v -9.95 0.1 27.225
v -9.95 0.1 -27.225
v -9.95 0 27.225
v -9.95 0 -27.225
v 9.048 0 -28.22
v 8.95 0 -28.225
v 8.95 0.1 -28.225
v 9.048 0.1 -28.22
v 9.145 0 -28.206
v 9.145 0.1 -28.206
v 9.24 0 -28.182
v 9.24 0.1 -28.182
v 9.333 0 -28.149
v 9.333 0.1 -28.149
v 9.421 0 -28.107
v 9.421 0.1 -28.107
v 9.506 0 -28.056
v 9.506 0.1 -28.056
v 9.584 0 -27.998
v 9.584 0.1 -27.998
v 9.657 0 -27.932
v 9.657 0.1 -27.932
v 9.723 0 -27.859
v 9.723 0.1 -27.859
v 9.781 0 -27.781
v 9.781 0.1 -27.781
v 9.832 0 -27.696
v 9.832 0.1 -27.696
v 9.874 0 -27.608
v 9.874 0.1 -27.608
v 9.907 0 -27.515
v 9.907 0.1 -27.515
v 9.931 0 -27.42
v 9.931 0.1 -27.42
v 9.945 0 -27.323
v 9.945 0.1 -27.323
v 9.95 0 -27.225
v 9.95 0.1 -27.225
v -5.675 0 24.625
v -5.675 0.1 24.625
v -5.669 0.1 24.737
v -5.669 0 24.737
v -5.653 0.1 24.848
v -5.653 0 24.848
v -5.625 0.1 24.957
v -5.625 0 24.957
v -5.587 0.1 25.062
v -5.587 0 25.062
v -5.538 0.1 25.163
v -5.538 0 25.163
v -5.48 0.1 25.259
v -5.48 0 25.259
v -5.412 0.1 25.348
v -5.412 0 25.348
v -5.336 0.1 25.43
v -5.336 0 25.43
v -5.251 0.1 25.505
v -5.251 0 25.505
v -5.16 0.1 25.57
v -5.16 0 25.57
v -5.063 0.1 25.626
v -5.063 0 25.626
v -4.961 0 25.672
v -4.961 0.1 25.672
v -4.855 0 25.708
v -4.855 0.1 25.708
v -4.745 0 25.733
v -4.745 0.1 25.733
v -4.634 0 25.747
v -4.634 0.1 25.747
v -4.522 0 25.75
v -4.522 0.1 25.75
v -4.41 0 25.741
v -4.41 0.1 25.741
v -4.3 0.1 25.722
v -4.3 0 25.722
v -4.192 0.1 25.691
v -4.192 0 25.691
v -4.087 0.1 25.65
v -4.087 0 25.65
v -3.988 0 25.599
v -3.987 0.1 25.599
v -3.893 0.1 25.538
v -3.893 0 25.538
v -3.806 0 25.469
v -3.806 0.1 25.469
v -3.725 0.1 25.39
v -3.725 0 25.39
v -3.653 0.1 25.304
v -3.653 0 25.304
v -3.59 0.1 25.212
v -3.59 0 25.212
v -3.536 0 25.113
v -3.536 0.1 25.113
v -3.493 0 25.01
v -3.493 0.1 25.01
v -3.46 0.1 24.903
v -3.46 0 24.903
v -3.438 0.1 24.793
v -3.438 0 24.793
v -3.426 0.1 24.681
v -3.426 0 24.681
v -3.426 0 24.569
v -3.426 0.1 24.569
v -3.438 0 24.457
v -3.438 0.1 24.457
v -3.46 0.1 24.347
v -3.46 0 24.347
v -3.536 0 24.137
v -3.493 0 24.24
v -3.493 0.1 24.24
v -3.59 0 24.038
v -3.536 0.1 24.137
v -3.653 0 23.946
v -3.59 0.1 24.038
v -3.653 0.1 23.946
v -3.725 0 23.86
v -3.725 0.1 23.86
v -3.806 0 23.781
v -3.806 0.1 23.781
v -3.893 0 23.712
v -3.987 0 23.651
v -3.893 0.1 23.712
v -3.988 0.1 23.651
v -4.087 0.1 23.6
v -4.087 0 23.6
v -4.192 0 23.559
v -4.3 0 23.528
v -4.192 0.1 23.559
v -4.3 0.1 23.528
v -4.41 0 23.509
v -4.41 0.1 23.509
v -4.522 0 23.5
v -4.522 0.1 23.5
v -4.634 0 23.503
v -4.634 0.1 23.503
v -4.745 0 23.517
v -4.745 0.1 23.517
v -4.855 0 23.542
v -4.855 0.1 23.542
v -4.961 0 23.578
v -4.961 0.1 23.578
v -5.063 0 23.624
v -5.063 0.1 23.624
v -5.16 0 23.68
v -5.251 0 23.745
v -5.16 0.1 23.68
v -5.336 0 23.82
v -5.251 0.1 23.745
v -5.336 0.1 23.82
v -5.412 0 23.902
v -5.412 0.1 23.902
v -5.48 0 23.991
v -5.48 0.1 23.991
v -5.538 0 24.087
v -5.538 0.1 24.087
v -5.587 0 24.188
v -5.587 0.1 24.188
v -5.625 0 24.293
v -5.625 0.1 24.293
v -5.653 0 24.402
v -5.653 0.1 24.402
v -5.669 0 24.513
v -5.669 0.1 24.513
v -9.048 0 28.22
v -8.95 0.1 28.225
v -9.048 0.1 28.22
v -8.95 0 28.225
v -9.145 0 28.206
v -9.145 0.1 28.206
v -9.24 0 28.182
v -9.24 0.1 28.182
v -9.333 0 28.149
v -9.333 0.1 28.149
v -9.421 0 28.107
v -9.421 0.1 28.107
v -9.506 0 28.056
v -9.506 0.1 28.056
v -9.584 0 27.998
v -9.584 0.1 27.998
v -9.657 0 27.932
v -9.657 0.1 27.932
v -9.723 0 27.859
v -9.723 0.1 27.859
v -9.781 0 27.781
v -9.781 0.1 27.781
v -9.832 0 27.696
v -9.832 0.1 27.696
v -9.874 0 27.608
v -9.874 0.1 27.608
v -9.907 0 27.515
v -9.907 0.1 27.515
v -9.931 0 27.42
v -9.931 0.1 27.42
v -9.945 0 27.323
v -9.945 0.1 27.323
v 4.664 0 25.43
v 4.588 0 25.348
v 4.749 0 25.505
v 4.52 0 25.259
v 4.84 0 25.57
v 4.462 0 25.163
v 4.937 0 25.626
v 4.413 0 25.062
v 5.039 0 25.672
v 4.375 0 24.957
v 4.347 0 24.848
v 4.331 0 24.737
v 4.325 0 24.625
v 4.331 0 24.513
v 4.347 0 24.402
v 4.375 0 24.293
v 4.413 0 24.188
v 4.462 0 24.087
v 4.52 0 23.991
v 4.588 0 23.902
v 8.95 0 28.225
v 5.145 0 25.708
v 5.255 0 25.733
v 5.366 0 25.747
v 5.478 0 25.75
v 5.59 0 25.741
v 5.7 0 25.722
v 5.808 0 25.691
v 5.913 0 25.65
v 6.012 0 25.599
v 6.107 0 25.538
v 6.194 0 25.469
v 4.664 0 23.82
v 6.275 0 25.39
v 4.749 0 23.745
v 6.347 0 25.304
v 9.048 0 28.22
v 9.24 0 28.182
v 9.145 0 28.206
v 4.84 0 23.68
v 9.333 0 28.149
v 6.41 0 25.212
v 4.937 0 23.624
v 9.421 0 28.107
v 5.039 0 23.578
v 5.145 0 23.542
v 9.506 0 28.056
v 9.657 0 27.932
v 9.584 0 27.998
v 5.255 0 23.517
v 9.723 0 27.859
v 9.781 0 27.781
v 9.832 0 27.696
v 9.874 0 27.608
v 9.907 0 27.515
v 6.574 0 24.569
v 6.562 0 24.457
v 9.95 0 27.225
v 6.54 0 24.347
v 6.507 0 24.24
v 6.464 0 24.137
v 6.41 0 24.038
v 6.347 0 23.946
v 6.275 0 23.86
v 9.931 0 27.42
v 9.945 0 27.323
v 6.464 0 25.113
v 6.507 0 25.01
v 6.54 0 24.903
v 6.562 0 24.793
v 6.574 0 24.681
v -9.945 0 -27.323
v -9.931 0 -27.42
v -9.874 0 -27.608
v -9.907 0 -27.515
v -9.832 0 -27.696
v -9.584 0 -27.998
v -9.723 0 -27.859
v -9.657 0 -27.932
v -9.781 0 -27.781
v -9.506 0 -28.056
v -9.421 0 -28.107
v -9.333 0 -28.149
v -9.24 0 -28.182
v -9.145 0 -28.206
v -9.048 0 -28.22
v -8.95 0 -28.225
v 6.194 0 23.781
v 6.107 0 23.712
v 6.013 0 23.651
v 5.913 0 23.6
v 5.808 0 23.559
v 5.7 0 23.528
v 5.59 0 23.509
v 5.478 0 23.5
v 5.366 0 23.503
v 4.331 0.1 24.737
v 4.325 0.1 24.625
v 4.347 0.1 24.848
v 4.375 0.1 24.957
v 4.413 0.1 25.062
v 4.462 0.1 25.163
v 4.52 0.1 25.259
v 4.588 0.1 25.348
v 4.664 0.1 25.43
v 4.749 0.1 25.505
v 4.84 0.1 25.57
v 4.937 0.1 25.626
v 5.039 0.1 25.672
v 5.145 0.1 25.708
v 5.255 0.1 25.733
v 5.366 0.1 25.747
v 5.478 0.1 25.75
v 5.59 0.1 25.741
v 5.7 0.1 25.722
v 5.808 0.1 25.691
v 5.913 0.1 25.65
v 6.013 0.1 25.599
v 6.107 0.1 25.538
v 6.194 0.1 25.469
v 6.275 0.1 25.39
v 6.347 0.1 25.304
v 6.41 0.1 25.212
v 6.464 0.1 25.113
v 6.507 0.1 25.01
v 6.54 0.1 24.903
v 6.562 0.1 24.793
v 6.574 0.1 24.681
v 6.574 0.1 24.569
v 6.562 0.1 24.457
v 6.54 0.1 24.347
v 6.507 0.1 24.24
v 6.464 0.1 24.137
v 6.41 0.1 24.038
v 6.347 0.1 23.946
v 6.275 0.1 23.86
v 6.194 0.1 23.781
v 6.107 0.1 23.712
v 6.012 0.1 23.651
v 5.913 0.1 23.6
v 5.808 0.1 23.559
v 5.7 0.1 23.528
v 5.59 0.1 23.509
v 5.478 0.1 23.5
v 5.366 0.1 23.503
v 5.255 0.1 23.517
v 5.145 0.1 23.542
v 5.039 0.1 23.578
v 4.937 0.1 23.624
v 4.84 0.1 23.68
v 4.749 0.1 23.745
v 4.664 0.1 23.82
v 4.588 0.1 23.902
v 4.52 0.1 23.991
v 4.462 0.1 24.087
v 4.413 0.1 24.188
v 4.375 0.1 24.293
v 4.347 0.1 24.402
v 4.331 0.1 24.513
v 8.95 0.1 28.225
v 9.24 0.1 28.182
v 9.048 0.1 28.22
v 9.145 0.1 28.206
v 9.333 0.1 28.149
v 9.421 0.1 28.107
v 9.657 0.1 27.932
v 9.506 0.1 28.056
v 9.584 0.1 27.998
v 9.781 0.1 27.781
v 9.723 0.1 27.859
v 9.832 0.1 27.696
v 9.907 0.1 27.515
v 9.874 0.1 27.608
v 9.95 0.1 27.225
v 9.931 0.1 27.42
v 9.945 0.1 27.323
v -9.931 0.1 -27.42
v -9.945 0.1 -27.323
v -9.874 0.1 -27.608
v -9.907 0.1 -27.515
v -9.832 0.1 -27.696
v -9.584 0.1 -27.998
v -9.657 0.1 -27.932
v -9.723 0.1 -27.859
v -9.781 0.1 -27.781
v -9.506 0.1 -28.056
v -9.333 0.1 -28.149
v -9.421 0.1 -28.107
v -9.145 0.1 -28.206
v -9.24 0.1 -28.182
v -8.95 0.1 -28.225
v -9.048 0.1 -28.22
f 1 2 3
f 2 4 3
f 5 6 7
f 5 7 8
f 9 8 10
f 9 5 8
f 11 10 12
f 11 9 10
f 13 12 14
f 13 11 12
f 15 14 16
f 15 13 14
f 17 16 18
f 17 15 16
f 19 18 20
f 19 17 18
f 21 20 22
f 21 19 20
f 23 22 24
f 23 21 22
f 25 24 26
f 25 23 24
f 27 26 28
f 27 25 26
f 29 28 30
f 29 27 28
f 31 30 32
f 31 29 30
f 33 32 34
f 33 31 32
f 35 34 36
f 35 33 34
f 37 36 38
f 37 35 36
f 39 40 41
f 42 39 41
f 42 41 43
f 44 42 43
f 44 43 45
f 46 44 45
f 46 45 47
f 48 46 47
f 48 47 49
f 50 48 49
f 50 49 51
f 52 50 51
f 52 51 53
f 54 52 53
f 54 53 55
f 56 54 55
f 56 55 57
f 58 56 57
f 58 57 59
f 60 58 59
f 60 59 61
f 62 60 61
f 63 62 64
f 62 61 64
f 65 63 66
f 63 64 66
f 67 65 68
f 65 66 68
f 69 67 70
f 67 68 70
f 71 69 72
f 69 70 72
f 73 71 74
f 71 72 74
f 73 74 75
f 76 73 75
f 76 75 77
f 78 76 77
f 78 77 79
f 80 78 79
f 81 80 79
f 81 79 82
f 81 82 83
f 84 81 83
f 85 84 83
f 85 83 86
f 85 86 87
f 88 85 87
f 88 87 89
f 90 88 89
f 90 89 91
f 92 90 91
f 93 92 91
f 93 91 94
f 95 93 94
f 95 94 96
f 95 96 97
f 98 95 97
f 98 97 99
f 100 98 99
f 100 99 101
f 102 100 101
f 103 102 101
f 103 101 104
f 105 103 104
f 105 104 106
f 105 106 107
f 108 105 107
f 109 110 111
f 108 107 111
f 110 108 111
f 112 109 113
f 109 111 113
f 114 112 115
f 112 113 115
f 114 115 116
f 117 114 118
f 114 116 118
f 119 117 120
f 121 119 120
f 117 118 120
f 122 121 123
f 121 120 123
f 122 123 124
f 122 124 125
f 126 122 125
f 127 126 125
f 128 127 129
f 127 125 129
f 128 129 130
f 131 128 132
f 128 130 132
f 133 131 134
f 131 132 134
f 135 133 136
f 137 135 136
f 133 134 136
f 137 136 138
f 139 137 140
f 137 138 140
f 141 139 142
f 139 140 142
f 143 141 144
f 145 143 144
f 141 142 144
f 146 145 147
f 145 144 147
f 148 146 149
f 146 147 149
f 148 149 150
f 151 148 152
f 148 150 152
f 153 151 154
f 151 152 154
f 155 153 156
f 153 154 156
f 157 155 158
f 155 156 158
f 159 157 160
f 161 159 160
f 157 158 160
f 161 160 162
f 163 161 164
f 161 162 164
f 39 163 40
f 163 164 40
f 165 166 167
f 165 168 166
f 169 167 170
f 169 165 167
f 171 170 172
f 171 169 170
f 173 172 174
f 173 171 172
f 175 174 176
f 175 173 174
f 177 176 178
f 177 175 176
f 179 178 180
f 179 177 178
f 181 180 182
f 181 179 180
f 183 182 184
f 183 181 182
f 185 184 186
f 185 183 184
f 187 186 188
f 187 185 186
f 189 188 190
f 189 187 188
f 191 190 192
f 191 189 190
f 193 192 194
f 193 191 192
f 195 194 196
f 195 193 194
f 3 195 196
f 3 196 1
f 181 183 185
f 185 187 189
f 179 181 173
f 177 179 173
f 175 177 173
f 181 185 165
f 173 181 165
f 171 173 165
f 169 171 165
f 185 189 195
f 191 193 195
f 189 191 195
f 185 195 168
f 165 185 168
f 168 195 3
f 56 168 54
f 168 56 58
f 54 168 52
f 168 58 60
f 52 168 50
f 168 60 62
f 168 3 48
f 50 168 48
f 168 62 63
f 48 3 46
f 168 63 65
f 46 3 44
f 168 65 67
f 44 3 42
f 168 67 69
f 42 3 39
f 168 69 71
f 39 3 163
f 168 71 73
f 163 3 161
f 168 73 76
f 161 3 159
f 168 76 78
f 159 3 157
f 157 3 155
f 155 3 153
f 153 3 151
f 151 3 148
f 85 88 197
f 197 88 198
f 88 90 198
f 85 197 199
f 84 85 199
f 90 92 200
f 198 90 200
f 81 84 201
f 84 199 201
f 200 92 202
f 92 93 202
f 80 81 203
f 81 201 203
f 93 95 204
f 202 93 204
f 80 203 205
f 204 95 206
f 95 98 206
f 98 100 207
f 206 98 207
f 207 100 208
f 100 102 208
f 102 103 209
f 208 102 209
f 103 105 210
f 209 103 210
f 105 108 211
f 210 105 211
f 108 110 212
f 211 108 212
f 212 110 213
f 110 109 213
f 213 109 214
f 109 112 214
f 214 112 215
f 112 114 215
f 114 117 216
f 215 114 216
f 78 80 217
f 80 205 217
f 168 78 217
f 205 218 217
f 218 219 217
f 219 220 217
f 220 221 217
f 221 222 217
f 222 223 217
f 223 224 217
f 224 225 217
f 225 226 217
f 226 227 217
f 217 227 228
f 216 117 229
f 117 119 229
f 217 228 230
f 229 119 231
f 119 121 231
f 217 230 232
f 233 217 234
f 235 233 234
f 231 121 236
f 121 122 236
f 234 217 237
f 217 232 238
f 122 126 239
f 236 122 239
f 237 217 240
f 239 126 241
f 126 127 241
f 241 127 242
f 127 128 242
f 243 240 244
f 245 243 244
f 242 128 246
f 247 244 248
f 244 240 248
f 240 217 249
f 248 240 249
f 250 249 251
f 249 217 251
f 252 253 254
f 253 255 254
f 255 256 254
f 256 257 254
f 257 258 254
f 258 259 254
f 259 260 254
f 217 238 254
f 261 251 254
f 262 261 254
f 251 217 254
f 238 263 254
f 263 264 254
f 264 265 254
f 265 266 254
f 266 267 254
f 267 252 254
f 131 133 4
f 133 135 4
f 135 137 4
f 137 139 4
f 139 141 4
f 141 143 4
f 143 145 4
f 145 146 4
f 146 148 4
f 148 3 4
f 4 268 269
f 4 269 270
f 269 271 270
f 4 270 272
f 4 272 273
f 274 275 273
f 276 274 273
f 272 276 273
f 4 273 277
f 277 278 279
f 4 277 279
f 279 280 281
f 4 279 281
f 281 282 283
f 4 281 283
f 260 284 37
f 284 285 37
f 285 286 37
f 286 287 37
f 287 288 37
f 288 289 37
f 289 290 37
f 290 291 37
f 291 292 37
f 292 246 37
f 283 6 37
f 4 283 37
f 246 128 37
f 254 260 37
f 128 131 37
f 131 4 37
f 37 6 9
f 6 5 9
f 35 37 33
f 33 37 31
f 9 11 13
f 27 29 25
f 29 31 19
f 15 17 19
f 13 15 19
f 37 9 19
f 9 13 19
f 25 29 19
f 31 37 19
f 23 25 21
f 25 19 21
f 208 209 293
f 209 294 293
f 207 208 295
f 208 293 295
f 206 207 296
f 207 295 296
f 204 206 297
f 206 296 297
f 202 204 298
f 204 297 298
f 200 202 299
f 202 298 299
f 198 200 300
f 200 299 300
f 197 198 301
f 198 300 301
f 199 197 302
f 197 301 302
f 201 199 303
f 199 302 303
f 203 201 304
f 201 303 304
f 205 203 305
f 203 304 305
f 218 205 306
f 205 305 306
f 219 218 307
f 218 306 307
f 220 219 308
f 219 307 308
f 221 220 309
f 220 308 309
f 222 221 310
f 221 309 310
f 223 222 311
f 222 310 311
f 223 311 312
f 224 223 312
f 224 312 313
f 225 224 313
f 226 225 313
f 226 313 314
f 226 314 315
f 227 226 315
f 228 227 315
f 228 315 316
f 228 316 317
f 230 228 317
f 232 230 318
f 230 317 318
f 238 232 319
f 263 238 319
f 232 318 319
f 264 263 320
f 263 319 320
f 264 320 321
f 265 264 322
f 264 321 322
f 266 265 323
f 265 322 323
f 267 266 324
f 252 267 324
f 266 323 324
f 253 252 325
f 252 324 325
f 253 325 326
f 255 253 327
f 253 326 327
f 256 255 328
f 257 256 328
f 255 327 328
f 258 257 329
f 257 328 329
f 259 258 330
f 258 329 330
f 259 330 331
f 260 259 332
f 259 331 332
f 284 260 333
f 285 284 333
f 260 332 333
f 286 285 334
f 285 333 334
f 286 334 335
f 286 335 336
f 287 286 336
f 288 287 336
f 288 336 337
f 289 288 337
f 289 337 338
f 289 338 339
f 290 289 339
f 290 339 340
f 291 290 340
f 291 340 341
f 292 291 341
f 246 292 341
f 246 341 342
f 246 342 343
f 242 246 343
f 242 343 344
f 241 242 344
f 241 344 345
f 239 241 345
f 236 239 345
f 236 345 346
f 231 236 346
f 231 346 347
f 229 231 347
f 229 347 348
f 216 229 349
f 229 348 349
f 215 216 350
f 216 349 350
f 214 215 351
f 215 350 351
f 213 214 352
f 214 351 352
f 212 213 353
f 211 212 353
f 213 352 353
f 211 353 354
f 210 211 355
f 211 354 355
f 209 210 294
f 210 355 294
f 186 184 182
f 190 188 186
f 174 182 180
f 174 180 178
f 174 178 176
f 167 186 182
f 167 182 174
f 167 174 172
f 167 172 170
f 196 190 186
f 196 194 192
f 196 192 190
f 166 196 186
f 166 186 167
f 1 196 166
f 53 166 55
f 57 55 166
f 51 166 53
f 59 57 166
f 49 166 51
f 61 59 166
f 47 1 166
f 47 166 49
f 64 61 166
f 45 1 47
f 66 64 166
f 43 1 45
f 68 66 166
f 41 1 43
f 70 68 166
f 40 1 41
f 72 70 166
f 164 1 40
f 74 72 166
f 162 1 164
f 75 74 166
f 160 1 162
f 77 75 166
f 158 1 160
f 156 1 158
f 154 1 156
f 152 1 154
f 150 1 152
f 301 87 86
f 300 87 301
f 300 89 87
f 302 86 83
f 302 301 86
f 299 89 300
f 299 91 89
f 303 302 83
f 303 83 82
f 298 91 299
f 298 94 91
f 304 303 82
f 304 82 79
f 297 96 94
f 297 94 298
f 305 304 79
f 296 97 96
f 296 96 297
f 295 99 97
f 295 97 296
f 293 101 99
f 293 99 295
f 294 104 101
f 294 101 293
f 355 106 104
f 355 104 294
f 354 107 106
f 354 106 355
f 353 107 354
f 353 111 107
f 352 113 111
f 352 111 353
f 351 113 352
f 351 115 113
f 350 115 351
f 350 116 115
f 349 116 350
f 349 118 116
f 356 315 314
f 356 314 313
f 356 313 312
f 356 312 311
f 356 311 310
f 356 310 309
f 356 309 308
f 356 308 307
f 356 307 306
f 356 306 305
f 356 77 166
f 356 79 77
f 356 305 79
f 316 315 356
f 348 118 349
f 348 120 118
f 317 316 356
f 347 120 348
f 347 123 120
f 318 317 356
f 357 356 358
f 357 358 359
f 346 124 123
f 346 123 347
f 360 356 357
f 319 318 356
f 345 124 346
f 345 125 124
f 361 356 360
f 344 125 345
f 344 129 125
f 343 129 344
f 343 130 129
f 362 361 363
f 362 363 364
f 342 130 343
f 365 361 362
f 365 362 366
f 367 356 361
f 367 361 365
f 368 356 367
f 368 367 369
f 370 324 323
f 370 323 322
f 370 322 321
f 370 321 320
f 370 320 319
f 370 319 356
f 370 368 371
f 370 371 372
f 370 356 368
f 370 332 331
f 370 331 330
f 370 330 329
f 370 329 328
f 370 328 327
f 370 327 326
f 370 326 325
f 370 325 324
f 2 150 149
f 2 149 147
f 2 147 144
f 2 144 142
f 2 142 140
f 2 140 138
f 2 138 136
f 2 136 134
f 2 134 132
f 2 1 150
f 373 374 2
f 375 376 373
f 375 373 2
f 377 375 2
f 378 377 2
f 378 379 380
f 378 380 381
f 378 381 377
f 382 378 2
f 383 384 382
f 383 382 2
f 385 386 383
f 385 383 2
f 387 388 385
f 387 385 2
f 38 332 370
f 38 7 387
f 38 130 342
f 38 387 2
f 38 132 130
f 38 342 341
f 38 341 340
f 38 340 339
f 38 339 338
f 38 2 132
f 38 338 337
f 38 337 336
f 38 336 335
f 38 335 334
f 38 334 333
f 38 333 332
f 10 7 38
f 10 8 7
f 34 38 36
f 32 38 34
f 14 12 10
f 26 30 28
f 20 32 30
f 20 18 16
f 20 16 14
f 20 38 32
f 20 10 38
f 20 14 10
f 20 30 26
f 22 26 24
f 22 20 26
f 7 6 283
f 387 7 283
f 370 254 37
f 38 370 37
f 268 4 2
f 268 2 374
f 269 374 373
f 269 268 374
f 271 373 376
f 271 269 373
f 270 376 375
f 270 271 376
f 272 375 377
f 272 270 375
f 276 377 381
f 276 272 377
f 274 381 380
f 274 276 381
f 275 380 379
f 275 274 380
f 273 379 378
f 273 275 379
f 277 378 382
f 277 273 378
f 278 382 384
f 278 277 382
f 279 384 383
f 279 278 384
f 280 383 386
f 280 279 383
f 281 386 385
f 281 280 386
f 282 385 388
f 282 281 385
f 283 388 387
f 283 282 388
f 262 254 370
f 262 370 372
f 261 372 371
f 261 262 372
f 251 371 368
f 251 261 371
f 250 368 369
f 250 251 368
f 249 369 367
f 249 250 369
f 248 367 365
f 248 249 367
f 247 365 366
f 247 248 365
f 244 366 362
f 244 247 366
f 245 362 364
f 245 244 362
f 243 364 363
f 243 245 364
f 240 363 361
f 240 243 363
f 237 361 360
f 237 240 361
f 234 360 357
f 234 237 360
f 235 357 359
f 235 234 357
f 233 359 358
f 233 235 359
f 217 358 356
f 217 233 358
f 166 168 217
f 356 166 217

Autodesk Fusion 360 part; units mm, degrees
sketch "Sketch1" plane through (0, 0, 0) normal (0, 1, 0) x (1, 0, 0)
  line L0 (8.95, 28.225) -> (-8.95, 28.225)
  line L1 (-9.95, 27.225) -> (-9.95, -27.225)
  line L2 (-8.95, -28.225) -> (8.95, -28.225)
  line L3 (9.95, -27.225) -> (9.95, 27.225)
  line L4 (9.95, 28.225) -> (-9.95, -28.225) construction
  line L5 (-9.95, 28.225) -> (9.95, -28.225) construction
  arc A0 (-9.95, -27.225) -> (-8.95, -28.225) centre (-8.95, -27.225) ccw
  arc A1 (8.95, -28.225) -> (9.95, -27.225) centre (8.95, -27.225) ccw
  arc A2 (-8.95, 28.225) -> (-9.95, 27.225) centre (-8.95, 27.225) ccw
  arc A3 (9.95, 27.225) -> (8.95, 28.225) centre (8.95, 27.225) ccw
  dimension "d1" = 19.9
  dimension "d2" = 56.45
  dimension "d3" = 1
  dimension "d4" = 1
  dimension "d5" = 1
  dimension "d6" = 1
extrude "Extrude1" add sketch "Sketch1" along normal blind 0.1
sketch "Sketch2" plane through (0, 0.1, 0) normal (0, 1, 0) x (-1, 0, 0)
  arc A0 (-9.95, -27.225) -> (-8.95, -28.225) centre (-8.95, -27.225) ccw
  line L0 (-8.95, -28.225) -> (8.95, -28.225)
  arc A1 (8.95, -28.225) -> (9.95, -27.225) centre (8.95, -27.225) ccw
  line L1 (9.95, -27.225) -> (9.95, 27.225)
  arc A2 (9.95, 27.225) -> (8.95, 28.225) centre (8.95, 27.225) ccw
  line L2 (8.95, 28.225) -> (-8.95, 28.225)
  arc A3 (-8.95, 28.225) -> (-9.95, 27.225) centre (-8.95, 27.225) ccw
  line L3 (-9.95, 27.225) -> (-9.95, -27.225)
  line L4 (0, 28.225) -> (0, 24.625)
  line L5 (0, 24.625) -> (9.95, 24.625)
  line L6 (0, 24.625) -> (-9.95, 24.625)
  line L7 (9.95, 24.625) -> (4.55, 24.625)
  circle A4 centre (4.55, 24.625) radius 1.125
  line L8 (4.55, 24.625) -> (-5.45, 24.625)
  circle A5 centre (-5.45, 24.625) radius 1.125
  dimension "d9" = 3.6
  dimension "d10" = 5.4
  dimension "d11" = 2.25
  dimension "d12" = 10
  dimension "d13" = 2.25
extrude "Extrude2" cut sketch "Sketch2" against normal blind 0.1 contours L6 L8 A5 | L6 L8 A5 | L5 L7 A4 L8 | L5 L7 A4 L8
sketch "Sketch3" plane through (0, 0.1, 0) normal (0, 1, 0) x (-1, 0, 0)
  circle A0 centre (4.55, 24.625) radius 1.125
  circle A1 centre (-5.45, 24.625) radius 1.125
  arc A2 (-9.95, -27.225) -> (-8.95, -28.225) centre (-8.95, -27.225) ccw
  line L0 (-8.95, -28.225) -> (8.95, -28.225)
  arc A3 (8.95, -28.225) -> (9.95, -27.225) centre (8.95, -27.225) ccw
  line L1 (9.95, -27.225) -> (9.95, 27.225)
  arc A4 (9.95, 27.225) -> (8.95, 28.225) centre (8.95, 27.225) ccw
  line L2 (8.95, 28.225) -> (-8.95, 28.225)
  arc A5 (-8.95, 28.225) -> (-9.95, 27.225) centre (-8.95, 27.225) ccw
  line L3 (-9.95, 27.225) -> (-9.95, -27.225)
